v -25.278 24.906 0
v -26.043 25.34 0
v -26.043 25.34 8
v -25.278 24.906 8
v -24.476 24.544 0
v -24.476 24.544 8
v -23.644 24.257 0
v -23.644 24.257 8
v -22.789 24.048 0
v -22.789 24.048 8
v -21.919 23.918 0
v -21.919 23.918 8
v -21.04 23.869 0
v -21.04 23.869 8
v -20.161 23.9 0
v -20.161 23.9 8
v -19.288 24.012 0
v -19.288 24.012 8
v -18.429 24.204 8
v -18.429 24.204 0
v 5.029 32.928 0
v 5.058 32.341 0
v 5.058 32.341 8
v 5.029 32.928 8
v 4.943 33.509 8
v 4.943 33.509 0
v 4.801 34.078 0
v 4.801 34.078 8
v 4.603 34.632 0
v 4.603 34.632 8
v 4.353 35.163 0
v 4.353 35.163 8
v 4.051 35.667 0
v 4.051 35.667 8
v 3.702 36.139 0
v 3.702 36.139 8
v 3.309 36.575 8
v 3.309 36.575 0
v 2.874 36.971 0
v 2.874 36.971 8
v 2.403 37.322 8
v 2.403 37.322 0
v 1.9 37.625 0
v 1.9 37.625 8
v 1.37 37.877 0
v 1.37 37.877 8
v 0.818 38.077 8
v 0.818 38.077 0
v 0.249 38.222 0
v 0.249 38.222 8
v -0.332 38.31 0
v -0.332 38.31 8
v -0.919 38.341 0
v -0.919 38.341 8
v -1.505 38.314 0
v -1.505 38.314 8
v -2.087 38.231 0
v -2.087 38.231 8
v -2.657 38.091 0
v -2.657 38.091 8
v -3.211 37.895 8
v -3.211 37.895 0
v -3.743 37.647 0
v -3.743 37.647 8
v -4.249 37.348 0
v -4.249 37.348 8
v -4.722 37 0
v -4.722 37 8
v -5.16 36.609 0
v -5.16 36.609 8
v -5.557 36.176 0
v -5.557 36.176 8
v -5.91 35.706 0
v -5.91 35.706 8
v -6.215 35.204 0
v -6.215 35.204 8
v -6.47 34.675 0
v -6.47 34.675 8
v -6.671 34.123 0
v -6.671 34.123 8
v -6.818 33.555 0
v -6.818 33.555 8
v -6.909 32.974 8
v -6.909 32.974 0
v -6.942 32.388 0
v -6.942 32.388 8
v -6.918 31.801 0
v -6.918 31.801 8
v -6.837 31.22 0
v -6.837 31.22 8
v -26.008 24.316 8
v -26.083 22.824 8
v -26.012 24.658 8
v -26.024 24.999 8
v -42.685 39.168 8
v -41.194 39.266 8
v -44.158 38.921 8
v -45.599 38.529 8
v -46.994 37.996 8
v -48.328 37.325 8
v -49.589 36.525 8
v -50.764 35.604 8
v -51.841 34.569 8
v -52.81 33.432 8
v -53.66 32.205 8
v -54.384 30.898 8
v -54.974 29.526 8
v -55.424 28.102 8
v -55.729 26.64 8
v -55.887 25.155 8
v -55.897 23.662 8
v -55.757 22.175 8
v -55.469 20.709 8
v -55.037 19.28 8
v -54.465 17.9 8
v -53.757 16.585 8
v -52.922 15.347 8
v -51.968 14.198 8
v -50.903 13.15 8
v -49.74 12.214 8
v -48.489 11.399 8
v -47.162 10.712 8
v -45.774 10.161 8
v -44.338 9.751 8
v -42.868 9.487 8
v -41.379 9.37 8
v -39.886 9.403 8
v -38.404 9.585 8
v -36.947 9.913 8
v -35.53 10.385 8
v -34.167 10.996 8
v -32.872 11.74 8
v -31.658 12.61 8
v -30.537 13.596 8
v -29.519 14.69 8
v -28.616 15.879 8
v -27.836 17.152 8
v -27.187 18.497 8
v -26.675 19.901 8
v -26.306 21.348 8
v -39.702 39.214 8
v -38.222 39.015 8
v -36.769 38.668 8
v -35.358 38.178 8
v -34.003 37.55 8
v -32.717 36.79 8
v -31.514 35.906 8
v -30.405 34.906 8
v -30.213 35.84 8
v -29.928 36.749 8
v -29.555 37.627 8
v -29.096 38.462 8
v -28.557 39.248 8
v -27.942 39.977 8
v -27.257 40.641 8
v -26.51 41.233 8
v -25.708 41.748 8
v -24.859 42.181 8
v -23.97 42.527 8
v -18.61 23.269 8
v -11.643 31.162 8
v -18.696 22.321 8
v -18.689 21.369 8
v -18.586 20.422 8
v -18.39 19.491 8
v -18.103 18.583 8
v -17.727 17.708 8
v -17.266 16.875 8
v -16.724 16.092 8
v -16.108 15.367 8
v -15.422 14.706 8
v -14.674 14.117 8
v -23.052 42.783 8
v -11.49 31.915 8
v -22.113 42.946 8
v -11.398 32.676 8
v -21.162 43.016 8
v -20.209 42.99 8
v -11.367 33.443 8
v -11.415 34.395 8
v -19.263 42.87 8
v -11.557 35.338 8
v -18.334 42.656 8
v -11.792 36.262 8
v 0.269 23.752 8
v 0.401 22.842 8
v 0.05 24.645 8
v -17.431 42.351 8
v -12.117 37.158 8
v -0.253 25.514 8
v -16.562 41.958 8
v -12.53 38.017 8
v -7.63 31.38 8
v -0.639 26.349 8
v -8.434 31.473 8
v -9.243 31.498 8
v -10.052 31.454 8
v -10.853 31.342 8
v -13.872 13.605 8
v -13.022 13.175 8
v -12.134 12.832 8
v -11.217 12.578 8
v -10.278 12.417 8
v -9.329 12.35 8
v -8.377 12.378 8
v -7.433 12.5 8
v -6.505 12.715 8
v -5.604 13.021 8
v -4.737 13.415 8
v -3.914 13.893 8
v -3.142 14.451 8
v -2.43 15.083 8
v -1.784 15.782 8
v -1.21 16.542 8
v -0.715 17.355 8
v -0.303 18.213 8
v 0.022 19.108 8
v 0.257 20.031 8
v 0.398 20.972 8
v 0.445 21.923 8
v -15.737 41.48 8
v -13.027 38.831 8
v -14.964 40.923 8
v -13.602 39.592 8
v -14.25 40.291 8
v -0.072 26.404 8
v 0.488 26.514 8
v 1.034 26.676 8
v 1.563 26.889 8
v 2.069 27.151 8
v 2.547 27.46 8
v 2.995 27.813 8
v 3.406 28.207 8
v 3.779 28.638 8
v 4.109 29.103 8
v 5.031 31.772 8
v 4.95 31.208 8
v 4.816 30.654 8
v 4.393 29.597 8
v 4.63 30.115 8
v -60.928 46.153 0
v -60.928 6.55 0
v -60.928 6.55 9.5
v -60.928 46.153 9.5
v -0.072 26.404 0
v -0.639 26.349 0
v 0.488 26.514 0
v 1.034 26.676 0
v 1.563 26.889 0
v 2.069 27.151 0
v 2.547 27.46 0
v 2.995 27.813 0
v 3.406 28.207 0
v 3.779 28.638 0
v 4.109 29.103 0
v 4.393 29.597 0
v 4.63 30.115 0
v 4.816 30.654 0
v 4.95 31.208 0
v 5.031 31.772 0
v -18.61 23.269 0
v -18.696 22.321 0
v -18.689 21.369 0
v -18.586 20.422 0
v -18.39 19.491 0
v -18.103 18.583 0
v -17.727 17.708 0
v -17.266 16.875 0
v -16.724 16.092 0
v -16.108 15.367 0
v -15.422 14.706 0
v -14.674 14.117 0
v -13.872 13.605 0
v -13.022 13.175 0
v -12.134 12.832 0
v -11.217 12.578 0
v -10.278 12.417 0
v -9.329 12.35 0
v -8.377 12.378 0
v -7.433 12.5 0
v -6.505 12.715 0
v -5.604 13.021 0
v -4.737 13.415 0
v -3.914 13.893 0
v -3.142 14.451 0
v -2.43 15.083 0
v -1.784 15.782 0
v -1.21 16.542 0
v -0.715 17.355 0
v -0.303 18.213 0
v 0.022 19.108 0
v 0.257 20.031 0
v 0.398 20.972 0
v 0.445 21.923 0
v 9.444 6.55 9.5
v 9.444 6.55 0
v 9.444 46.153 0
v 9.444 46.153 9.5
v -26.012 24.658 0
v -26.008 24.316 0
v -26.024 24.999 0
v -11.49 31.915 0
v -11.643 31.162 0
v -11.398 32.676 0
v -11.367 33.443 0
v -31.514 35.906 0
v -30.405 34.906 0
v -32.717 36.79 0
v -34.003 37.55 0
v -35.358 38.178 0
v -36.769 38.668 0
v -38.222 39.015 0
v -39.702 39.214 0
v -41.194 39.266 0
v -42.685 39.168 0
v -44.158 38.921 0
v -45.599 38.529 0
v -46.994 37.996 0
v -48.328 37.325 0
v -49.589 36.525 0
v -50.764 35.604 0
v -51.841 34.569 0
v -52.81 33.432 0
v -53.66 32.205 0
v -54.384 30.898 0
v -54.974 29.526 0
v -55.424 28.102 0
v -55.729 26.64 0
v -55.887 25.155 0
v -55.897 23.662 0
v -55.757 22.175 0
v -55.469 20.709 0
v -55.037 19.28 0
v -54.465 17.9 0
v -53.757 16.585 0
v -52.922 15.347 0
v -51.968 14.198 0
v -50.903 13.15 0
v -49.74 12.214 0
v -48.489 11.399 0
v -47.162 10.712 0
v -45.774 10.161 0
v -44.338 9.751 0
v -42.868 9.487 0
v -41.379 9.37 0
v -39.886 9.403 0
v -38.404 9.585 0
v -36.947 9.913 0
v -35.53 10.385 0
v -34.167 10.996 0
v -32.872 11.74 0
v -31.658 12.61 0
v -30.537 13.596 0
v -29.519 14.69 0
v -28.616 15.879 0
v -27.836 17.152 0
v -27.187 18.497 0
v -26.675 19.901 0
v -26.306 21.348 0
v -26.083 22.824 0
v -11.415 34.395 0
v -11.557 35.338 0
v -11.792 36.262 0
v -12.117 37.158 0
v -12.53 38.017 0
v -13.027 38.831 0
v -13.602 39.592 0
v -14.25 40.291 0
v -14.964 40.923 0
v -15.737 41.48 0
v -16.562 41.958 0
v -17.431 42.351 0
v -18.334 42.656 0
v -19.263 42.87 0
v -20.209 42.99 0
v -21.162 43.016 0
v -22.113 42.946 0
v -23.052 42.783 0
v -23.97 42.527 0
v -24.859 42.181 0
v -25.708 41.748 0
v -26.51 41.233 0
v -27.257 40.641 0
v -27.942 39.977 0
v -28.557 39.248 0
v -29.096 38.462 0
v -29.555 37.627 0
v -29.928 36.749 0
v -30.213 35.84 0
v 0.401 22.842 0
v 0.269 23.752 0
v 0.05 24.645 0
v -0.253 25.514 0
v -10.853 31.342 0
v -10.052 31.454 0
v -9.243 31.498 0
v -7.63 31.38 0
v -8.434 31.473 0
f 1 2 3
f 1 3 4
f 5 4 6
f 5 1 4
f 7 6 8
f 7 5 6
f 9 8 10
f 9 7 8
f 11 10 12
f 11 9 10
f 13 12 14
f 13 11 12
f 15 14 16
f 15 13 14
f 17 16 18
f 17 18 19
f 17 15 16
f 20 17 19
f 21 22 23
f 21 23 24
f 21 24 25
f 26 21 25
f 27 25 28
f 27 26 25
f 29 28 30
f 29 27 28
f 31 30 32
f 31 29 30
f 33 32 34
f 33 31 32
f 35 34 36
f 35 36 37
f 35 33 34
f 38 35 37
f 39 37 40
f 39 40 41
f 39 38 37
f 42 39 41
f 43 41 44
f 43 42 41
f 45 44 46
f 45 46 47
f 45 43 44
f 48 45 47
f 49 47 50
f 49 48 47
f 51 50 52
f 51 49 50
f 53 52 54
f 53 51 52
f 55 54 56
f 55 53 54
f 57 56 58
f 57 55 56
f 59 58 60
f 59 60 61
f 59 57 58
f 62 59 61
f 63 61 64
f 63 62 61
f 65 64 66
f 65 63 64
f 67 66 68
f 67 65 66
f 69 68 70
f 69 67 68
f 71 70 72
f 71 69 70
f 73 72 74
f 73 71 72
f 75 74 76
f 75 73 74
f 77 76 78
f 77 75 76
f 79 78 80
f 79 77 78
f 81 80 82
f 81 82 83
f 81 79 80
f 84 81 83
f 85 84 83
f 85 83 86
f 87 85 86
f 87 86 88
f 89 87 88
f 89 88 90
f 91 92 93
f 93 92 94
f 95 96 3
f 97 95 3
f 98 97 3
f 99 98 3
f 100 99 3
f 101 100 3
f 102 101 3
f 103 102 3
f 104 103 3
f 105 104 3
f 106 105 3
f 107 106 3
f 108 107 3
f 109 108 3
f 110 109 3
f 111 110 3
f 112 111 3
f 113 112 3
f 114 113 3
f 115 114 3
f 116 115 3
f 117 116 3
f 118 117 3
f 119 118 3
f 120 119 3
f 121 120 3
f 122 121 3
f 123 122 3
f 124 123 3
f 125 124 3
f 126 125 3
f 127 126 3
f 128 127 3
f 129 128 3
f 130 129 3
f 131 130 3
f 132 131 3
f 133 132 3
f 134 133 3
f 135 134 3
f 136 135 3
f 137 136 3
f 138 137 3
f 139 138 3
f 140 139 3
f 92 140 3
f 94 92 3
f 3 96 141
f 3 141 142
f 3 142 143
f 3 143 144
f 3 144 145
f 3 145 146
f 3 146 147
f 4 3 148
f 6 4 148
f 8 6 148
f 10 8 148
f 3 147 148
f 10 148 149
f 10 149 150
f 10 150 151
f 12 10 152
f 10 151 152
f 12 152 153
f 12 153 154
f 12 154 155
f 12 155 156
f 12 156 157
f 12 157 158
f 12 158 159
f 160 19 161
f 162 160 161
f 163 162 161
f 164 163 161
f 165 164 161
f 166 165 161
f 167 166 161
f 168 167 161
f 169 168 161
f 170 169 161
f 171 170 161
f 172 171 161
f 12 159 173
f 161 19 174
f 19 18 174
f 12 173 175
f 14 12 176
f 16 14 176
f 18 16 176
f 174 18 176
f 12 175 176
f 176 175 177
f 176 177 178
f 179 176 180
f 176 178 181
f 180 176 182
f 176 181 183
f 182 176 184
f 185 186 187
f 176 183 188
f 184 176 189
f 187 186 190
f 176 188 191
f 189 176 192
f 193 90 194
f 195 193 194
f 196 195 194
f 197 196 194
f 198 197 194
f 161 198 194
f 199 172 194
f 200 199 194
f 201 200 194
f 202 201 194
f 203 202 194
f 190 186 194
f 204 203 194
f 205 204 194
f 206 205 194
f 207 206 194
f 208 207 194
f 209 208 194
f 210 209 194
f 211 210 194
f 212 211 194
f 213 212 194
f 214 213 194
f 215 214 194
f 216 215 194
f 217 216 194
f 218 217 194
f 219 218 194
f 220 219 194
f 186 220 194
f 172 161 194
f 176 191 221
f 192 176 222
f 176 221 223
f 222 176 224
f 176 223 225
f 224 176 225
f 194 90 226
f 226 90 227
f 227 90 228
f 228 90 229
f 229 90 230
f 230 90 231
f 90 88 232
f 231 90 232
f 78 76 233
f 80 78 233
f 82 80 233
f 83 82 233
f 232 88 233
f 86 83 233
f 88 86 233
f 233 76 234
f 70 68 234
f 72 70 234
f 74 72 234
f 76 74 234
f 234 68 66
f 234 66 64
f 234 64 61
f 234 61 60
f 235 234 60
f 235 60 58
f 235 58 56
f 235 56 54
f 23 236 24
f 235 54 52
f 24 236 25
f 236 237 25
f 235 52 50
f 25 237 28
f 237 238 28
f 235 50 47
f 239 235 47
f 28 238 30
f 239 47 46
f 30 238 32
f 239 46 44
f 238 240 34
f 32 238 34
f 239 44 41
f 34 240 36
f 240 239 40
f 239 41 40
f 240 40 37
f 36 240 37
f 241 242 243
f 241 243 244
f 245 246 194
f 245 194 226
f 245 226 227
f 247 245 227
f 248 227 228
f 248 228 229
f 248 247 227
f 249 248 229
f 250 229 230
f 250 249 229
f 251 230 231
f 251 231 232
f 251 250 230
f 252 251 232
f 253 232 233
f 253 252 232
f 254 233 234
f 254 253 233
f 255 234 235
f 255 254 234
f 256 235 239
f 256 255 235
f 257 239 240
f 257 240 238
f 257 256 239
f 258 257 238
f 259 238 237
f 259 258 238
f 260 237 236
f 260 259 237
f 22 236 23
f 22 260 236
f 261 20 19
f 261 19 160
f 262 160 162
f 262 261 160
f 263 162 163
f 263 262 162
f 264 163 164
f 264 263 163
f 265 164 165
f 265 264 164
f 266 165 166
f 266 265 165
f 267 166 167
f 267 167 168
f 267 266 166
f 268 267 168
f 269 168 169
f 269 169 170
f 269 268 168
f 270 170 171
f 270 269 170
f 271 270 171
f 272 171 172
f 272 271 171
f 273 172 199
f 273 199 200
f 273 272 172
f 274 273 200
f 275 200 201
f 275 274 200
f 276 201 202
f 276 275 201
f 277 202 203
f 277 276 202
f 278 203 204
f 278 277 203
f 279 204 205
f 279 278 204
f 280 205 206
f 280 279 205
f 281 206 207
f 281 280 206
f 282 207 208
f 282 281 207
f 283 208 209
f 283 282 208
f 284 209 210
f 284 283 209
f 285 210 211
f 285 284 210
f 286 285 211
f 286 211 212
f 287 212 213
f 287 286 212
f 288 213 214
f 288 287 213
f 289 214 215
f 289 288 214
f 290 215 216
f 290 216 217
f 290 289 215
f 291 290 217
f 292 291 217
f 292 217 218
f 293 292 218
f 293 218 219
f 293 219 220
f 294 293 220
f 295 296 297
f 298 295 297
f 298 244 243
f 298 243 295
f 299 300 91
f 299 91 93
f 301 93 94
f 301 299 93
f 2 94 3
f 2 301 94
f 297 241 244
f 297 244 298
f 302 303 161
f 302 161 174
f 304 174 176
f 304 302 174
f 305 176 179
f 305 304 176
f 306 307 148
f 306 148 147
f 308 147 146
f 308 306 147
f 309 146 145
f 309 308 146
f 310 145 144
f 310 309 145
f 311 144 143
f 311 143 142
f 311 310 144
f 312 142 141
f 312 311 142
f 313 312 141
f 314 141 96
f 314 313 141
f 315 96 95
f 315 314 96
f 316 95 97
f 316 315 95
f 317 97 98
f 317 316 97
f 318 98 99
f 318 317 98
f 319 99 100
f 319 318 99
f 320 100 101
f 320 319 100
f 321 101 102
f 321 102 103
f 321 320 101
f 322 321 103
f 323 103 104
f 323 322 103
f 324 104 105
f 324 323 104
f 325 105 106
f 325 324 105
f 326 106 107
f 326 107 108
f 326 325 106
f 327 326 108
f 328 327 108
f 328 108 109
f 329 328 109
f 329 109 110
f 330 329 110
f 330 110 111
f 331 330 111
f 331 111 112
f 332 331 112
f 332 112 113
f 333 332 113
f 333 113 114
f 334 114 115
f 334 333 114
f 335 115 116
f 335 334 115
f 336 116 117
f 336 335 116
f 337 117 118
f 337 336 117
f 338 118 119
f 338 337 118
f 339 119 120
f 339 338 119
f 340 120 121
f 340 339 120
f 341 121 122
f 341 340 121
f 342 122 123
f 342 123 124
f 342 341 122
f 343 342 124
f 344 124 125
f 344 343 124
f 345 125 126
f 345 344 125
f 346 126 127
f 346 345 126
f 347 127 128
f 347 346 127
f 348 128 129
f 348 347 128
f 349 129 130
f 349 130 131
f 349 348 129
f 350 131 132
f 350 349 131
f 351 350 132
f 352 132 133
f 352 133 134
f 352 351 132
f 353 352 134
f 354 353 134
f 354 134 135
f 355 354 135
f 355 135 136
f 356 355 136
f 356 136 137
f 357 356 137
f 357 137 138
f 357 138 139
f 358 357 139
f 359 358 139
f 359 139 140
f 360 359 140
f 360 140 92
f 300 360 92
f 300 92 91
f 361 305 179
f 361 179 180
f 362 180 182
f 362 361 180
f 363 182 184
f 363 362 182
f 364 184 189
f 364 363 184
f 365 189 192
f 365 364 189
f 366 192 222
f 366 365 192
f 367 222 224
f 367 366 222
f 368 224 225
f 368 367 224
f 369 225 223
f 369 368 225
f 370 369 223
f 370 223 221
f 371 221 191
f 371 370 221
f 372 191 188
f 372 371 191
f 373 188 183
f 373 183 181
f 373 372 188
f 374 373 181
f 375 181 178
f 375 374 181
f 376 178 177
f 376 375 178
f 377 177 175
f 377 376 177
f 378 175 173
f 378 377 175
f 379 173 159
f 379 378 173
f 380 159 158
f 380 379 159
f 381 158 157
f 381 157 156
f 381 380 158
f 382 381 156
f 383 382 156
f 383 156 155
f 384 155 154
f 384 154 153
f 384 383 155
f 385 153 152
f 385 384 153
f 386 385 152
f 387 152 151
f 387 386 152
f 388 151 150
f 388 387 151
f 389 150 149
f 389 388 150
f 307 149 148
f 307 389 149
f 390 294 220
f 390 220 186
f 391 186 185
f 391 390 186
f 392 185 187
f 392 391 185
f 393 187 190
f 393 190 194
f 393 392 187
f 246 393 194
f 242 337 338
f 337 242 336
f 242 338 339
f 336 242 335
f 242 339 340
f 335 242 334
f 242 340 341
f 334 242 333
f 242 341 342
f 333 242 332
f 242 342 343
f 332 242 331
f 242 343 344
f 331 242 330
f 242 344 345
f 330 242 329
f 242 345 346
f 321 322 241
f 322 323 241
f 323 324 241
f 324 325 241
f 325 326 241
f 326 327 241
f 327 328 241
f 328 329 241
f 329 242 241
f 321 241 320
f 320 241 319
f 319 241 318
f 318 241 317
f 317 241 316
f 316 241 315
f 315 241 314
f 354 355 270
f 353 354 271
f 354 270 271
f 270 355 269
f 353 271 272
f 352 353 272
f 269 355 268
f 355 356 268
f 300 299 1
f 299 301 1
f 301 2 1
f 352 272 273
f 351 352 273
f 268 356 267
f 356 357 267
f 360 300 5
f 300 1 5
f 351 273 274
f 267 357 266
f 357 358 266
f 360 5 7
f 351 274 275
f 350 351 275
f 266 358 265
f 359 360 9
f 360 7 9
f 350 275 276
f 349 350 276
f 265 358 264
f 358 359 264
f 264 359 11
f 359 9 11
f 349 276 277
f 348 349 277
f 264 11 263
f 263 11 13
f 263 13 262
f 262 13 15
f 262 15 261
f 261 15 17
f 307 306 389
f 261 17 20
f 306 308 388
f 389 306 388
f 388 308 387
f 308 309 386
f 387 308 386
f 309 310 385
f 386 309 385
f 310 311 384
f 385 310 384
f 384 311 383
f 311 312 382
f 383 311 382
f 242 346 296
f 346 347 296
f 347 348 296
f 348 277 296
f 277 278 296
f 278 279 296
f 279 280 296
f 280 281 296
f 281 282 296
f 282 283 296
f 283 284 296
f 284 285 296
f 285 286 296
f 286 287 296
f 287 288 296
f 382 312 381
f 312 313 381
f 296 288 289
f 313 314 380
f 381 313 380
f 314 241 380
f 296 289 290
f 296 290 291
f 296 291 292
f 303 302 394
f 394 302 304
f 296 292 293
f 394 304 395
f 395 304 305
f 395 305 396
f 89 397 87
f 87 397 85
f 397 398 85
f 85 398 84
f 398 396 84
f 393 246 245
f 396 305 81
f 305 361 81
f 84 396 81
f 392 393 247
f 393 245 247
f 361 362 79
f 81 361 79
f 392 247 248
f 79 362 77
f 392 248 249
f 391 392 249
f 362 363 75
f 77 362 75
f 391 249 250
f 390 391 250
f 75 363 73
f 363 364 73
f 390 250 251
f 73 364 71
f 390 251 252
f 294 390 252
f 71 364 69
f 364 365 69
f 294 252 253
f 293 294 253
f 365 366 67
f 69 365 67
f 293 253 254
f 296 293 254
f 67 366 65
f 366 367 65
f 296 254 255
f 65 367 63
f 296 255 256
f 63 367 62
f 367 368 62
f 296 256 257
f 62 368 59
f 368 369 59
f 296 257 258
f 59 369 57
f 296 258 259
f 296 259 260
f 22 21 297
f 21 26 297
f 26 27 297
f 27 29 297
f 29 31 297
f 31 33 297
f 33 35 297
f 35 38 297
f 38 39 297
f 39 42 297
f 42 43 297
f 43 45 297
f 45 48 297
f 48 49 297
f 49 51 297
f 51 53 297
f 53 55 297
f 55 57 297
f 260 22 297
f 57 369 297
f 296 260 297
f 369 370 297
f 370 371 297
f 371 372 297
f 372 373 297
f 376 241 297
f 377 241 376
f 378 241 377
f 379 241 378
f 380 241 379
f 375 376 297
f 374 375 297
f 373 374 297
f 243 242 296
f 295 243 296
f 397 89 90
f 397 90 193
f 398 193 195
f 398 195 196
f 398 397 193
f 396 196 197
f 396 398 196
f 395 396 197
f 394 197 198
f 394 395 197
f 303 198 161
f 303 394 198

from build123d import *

# Parameters (mm, degrees)
F0_W     = 70.3723412007
F0_H     = 39.6034847945
F2_DEPTH = 9.5
F1_R     = 2.35
F3_DEPTH = 8


# Not quite as in the source:
# - the program builds the solid bodies; features that only make, move or delete a surface that nothing else refers to are left out


with BuildPart() as f2:
    # F0 (on Top) → F2 (new body)
    with BuildSketch(Plane.XY):
        with Locations((-25.7422635332, 26.3515496626)):
            Rectangle(F0_W, F0_H)
    extrude(amount=F2_DEPTH)

    # F1 (on face) → F3 (cut)
    with BuildSketch(Plane.XY):
        with BuildLine():
            ThreePointArc((-26.0081397088, 24.315958029), (-26.0169226605, 24.8283618655), (-26.0432611967, 25.3401636957))
            ThreePointArc((-26.0432611967, 25.3401636957), (-29.6543131579, 29.4708098057), (-30.4048881867, 34.9057496103))
            ThreePointArc((-30.4048881867, 34.9057496103), (-54.7680712155, 18.5828288025), (-26.0081397088, 24.315958029))
        make_face()
        with BuildLine():
            ThreePointArc((-18.4289942121, 24.2039844017), (-10.2782880331, 12.4173582289), (0.4453969671, 21.9232063115))
            ThreePointArc((0.4453969671, 21.9232063115), (0.1704350534, 24.2013451557), (-0.6386587183, 26.348642973))
            ThreePointArc((-0.6386587183, 26.348642973), (-4.6497239534, 27.6234855531), (-6.8365136406, 31.2195693659))
            ThreePointArc((-6.8365136406, 31.2195693659), (-9.2433206047, 31.4975310038), (-11.6428466394, 31.1624828835))
            ThreePointArc((-11.6428466394, 31.1624828835), (-14.0873300566, 26.758138344), (-18.4289942121, 24.2039844017))
        make_face()
        with BuildLine():
            ThreePointArc((-26.0432611967, 25.3401636957), (-22.3553467612, 23.9731105992), (-18.4289942121, 24.2039844017))
            ThreePointArc((-18.4289942121, 24.2039844017), (-15.9845107949, 28.6083289412), (-11.6428466394, 31.1624828835))
            ThreePointArc((-11.6428466394, 31.1624828835), (-11.436389736, 32.2945759735), (-11.3672378186, 33.4432609737))
            ThreePointArc((-11.3672378186, 33.4432609737), (-20.2088389756, 42.9901322485), (-30.4048881867, 34.9057496103))
            ThreePointArc((-30.4048881867, 34.9057496103), (-27.3555998695, 30.5189557333), (-26.0432611967, 25.3401636957))
        make_face()
        with Locations((-20.9422378186, 33.4432609737)):
            Circle(F1_R, mode=Mode.SUBTRACT)
        with BuildLine():
            ThreePointArc((-6.8365136406, 31.2195693659), (-3.2130730762, 29.4515061375), (-0.6386587183, 26.348642973))
            ThreePointArc((-0.6386587183, 26.348642973), (3.4064099368, 28.2070418834), (5.0577621814, 32.340958029))
            ThreePointArc((5.0577621814, 32.340958029), (-1.5054185479, 38.3144685099), (-6.8365136406, 31.2195693659))
        make_face()
        with BuildLine():
            ThreePointArc((-30.4048881867, 34.9057496103), (-29.6543131579, 29.4708098057), (-26.0432611967, 25.3401636957))
            ThreePointArc((-26.0432611967, 25.3401636957), (-27.3555998695, 30.5189557333), (-30.4048881867, 34.9057496103))
        make_face()
        with BuildLine():
            ThreePointArc((-11.6428466394, 31.1624828835), (-15.9845107949, 28.6083289412), (-18.4289942121, 24.2039844017))
            ThreePointArc((-18.4289942121, 24.2039844017), (-14.0873300566, 26.758138344), (-11.6428466394, 31.1624828835))
        make_face()
        with Locations((-20.9422378186, 33.4432609737)):
            Circle(F1_R)
        with BuildLine():
            ThreePointArc((-6.8365136406, 31.2195693659), (-4.6497239534, 27.6234855531), (-0.6386587183, 26.348642973))
            ThreePointArc((-0.6386587183, 26.348642973), (-3.2130730762, 29.4515061375), (-6.8365136406, 31.2195693659))
        make_face()
    extrude(amount=F3_DEPTH, mode=Mode.SUBTRACT)


solid = f2.part
